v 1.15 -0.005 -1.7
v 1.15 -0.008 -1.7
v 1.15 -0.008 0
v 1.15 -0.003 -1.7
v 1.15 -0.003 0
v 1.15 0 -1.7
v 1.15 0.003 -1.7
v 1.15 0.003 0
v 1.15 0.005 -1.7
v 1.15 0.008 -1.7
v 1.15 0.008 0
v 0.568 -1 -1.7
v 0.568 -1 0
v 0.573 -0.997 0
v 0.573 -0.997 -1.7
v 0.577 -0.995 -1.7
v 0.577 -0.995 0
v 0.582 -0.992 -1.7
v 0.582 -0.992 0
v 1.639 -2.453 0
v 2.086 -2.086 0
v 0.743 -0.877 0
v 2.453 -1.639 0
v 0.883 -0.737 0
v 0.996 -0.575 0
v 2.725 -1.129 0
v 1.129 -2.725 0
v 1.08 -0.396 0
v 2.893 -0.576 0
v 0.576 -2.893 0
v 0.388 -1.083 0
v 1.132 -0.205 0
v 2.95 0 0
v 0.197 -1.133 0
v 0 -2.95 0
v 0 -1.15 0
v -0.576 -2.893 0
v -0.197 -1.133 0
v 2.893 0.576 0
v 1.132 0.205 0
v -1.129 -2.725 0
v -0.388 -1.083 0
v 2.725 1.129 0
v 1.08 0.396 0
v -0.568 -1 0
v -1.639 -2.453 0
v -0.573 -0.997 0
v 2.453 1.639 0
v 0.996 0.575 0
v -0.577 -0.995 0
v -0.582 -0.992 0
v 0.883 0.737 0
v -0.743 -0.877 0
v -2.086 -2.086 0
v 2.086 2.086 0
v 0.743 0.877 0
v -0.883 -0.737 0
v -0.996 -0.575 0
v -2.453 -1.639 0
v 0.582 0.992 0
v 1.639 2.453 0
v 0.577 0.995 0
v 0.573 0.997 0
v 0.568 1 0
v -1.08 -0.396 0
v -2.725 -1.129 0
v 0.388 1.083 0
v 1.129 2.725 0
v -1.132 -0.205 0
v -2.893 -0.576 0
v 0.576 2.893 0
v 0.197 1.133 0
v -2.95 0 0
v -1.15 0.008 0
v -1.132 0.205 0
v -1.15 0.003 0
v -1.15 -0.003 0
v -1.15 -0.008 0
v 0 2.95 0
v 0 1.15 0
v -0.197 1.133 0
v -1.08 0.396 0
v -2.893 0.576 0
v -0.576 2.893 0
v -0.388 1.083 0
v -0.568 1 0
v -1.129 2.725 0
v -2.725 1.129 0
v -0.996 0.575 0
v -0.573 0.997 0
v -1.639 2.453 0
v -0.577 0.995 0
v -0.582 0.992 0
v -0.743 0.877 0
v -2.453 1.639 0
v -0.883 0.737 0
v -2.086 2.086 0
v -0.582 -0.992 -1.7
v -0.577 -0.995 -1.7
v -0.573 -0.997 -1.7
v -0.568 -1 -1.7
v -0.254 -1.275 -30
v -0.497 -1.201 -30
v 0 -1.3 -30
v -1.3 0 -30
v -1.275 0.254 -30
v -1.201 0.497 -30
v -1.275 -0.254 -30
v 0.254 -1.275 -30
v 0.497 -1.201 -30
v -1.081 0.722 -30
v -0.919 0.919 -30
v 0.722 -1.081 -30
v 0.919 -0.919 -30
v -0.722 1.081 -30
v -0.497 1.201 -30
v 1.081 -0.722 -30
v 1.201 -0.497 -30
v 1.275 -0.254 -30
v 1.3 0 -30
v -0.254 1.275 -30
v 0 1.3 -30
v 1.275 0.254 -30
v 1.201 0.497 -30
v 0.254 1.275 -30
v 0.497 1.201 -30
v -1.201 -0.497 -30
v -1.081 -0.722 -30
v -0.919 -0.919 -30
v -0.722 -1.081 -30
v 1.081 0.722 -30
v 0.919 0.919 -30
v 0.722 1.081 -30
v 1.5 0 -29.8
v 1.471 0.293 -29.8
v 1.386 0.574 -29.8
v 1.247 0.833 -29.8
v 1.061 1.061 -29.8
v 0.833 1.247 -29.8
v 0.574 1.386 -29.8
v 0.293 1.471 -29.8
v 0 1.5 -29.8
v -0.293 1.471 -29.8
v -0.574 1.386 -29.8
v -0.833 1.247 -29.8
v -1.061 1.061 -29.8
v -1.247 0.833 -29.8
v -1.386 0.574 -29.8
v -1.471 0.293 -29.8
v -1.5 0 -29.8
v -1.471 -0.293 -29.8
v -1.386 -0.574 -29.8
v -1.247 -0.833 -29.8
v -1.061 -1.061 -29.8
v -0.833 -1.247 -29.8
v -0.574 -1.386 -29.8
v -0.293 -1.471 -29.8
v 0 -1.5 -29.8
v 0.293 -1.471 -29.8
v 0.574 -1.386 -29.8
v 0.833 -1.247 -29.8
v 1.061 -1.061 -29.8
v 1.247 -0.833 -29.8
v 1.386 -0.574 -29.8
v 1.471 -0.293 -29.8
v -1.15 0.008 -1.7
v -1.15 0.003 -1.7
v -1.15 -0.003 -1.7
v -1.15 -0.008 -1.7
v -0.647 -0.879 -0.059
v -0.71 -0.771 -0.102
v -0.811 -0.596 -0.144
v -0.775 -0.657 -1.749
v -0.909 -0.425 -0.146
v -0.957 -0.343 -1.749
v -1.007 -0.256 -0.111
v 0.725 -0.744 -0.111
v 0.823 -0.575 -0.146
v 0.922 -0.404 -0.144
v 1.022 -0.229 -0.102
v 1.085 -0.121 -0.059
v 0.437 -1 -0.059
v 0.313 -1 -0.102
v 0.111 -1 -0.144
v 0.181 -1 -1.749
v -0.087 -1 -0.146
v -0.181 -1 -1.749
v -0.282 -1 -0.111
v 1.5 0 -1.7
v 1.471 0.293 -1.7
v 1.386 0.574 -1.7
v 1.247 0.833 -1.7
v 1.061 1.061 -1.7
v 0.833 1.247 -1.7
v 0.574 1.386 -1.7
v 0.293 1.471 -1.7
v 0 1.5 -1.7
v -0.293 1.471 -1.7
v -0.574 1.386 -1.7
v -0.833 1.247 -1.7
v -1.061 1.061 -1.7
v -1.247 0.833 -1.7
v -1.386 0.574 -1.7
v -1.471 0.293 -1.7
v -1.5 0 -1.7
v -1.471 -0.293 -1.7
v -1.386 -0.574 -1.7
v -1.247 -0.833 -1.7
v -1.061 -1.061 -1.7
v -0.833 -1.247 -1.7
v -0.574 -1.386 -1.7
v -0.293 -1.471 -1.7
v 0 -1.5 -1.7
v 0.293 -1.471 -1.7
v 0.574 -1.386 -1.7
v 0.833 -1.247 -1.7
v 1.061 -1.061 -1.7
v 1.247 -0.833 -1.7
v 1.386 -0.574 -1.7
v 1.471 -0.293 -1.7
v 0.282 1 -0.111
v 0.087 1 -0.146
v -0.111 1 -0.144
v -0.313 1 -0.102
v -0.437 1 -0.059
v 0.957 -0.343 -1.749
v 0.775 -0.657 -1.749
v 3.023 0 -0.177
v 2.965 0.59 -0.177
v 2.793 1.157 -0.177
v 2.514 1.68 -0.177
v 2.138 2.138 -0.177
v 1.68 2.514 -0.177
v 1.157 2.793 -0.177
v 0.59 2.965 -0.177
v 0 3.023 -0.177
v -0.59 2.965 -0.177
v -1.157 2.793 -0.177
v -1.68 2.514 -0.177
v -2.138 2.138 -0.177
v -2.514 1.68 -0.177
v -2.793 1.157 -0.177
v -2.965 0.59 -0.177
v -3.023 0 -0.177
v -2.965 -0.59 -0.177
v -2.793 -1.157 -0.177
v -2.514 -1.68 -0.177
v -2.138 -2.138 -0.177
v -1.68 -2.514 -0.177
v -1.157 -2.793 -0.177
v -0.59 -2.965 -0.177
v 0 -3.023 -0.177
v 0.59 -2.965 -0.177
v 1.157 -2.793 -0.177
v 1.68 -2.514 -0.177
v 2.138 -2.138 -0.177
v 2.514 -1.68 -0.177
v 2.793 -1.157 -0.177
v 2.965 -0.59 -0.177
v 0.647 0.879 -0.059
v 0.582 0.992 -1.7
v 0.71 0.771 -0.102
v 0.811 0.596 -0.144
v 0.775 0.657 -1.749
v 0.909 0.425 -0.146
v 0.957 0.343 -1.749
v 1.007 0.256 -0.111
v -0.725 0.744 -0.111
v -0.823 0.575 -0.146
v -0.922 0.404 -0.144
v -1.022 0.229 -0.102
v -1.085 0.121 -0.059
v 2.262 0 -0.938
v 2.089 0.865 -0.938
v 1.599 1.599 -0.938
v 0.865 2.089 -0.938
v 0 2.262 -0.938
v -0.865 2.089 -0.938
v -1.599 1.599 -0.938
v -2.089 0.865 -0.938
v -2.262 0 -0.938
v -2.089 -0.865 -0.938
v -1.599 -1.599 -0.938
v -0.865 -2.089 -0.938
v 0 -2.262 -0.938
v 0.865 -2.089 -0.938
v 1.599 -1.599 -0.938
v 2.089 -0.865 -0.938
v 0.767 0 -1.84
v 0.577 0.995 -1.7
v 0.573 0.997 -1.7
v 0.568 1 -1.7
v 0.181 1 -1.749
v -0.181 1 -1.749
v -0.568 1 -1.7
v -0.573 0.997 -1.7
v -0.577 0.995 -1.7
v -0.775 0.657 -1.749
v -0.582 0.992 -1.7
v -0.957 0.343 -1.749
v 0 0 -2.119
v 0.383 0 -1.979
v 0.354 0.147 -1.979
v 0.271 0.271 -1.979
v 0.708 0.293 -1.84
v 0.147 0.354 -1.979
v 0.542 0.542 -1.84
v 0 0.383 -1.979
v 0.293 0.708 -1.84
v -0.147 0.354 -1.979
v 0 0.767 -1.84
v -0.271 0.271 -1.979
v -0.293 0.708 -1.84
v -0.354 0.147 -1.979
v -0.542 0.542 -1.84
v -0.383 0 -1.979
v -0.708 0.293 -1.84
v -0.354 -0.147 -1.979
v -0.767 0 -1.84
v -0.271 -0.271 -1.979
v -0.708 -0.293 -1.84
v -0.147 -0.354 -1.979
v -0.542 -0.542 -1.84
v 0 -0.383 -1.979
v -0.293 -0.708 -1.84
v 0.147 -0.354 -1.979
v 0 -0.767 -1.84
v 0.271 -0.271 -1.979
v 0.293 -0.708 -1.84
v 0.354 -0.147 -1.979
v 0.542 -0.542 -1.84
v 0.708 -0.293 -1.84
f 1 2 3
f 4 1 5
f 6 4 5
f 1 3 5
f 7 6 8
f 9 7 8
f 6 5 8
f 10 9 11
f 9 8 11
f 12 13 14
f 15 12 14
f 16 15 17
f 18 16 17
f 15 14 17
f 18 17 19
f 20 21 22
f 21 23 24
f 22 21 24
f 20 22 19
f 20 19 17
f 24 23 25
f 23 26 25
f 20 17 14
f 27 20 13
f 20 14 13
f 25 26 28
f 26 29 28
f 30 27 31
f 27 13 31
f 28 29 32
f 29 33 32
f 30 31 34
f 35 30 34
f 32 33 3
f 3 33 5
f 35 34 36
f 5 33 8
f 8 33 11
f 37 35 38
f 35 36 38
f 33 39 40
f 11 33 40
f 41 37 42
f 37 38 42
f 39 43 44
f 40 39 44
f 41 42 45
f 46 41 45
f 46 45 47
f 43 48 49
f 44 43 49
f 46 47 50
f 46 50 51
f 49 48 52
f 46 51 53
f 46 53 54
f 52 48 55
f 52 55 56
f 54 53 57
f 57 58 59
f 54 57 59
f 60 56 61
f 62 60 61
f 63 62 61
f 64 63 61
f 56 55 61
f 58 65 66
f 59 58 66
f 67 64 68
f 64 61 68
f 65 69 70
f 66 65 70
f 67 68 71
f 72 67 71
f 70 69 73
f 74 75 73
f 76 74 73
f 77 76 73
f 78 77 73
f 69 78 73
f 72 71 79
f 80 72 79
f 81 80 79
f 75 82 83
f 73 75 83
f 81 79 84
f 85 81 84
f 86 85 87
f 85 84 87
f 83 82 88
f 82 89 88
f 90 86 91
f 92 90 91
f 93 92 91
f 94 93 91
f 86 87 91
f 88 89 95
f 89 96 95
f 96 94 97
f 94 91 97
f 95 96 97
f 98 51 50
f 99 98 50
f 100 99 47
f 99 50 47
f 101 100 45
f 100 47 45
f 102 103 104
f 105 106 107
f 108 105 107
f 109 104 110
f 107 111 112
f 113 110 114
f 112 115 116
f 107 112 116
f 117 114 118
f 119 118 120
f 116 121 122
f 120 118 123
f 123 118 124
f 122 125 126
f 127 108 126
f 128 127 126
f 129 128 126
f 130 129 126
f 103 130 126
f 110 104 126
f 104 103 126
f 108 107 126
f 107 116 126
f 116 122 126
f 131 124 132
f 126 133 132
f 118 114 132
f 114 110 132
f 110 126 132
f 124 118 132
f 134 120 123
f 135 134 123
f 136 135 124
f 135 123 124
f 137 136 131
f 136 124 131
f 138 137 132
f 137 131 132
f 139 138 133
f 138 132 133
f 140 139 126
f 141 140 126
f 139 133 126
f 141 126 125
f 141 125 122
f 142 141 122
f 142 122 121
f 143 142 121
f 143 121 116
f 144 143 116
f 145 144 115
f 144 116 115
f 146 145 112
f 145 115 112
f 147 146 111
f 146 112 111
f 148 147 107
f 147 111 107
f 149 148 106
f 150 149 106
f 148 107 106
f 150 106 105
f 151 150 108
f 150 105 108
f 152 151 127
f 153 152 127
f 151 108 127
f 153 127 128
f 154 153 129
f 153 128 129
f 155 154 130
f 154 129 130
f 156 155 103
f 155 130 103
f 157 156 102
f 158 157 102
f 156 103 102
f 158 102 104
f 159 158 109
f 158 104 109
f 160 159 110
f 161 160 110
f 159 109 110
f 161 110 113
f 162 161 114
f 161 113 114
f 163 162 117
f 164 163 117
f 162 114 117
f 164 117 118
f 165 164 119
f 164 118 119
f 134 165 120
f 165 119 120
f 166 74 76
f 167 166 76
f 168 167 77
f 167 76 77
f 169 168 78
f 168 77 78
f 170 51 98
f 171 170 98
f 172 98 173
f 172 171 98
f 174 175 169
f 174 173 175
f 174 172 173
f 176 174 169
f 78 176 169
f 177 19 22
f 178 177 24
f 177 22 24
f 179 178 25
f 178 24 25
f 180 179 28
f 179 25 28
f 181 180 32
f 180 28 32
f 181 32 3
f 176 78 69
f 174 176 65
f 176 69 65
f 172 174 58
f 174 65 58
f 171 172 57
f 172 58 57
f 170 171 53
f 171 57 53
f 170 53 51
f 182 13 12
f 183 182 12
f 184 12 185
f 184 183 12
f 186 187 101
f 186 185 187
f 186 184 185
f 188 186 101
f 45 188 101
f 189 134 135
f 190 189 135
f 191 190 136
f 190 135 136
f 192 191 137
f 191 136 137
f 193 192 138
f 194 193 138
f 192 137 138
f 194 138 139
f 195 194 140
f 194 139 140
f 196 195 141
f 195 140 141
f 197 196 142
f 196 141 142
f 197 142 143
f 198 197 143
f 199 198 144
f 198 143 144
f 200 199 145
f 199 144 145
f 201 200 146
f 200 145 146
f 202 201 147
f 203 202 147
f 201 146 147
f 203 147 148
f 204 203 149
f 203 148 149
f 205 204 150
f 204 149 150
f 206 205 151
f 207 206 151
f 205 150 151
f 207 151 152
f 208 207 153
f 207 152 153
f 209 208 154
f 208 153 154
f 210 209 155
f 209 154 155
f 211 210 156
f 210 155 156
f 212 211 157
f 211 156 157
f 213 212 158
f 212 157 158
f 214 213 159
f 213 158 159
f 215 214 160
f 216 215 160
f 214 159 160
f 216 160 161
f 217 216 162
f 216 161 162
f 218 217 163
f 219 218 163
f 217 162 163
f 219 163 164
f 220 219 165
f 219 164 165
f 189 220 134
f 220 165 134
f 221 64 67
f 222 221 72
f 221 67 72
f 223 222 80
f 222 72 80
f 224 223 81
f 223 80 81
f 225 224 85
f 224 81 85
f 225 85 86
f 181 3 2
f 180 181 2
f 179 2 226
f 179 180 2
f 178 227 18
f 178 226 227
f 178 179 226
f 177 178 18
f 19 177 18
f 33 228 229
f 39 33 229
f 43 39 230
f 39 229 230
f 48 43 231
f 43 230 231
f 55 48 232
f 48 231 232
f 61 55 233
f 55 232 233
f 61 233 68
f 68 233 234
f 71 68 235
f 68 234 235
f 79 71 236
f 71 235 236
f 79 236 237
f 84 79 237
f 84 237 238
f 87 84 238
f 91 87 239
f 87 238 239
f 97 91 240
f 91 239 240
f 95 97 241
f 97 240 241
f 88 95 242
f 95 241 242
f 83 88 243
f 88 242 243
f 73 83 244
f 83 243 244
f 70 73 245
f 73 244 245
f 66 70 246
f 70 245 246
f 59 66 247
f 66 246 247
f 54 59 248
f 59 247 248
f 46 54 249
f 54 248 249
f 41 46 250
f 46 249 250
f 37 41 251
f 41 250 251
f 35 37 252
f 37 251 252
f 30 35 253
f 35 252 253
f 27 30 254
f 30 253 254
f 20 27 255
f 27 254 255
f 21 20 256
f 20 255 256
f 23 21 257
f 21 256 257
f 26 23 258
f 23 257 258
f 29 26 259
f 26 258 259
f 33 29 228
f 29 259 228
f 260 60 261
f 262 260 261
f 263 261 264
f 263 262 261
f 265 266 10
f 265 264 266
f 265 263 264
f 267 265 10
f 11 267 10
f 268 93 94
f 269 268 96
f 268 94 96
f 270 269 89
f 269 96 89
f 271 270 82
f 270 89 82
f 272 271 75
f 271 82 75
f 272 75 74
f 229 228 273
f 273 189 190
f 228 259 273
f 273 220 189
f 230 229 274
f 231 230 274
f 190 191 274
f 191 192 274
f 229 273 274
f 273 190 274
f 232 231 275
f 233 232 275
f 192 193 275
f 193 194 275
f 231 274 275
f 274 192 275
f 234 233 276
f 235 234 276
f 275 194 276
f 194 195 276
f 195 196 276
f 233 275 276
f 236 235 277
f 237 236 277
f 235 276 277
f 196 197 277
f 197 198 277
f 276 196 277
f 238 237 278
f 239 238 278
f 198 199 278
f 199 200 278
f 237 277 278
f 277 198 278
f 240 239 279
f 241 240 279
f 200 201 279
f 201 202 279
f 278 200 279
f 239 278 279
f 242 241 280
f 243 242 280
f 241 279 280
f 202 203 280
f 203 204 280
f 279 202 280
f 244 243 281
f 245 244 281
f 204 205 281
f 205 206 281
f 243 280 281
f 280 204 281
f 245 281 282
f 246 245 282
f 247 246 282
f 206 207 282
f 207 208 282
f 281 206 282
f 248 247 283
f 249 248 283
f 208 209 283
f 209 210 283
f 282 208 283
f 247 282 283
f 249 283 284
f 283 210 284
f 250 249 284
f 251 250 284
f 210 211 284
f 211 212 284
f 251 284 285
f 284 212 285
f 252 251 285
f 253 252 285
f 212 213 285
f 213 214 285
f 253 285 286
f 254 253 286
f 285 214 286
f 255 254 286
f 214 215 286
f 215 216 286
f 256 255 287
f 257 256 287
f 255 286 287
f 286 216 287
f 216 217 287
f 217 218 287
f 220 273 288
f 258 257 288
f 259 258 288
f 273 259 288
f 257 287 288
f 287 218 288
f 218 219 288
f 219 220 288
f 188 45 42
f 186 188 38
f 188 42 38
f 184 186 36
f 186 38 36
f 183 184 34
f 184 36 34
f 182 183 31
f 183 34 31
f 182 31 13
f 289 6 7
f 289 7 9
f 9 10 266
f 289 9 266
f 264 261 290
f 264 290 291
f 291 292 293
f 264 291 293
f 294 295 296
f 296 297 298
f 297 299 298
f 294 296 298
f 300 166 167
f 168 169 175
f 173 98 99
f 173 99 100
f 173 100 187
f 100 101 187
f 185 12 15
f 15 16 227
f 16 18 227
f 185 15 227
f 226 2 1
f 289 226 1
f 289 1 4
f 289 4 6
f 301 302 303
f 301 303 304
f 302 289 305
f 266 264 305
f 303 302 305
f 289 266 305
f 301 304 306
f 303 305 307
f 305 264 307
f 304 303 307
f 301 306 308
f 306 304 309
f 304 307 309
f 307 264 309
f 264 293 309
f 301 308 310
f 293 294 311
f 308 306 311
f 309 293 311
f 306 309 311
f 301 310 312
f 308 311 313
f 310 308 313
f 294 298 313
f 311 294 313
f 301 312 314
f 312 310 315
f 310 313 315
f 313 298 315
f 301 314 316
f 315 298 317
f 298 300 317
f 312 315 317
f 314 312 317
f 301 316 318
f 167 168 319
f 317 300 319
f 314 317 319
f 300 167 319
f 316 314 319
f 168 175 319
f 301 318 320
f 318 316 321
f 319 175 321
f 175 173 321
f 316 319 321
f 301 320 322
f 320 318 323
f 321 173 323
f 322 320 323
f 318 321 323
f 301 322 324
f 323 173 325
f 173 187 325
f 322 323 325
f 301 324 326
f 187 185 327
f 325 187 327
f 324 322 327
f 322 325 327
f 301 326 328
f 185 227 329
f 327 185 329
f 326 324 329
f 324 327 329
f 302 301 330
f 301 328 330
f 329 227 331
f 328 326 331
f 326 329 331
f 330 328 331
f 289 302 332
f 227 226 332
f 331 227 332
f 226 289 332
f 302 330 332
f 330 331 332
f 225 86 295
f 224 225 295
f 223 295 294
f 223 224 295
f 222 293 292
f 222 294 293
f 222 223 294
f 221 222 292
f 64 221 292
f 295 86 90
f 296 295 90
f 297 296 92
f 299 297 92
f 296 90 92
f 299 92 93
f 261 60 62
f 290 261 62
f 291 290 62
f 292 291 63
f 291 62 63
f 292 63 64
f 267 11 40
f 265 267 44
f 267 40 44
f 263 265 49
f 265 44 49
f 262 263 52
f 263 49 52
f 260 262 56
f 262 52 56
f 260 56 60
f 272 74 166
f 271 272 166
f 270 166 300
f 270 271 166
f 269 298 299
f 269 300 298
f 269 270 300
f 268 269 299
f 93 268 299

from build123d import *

# Parameters (mm, degrees)
SKETCH001_R     = 2.15
POCKET_DEPTH    = 3.119566
CHAMFER_SIZE    = 0.25
CHAMFER001_SIZE = 0.2


with BuildPart() as pocket:
    # Sketch003 → Revolution001 (revolve)
    with BuildSketch(Plane.XZ):
        Polygon((0, -2.118566), (1.15, -1.7), (1.15, 1), (0, 1), align=None)
    revolve(axis=Axis((0, 0, 0), (0, 0, 1)))

    # Sketch001 (on Face3 of Revolution001) → Pocket (cut, through all)
    with BuildSketch(Plane(origin=(0, 0, 1), x_dir=(-1, 0, 0), z_dir=(0, 0, 1))):
        Circle(SKETCH001_R)
        Polygon((-0.57735, 1), (0.57735, 1), (1.154701, 0), (0.57735, -1), (-0.57735, -1), (-1.154701, 0), align=None, mode=Mode.SUBTRACT)
    extrude(amount=-POCKET_DEPTH, mode=Mode.SUBTRACT)


with BuildPart() as chamfer001:
    # Sketch → Revolution (revolve)
    with BuildSketch(Plane.XZ):
        Polygon((1.15, 0), (3.199999, 0), (1.5, -1.7), (1.5, -30), (0, -30), (0, -1.150001), align=None)
    revolve(axis=Axis((0, 0, 0), (0, 0, 1)))

    # Cut: cut Pocket
    add(pocket.part, mode=Mode.SUBTRACT)

    # Chamfer
    chamfer_edges = [chamfer001.edges().sort_by_distance(p)[0] for p in [
        (-3.199999, 0, 0),
    ]]
    chamfer(chamfer_edges, length=CHAMFER_SIZE)

    # Chamfer001
    chamfer001_edges = [chamfer001.edges().sort_by_distance(p)[0] for p in [
        (-1.5, 0, -30),
    ]]
    chamfer(chamfer001_edges, length=CHAMFER001_SIZE)


solid = chamfer001.part
